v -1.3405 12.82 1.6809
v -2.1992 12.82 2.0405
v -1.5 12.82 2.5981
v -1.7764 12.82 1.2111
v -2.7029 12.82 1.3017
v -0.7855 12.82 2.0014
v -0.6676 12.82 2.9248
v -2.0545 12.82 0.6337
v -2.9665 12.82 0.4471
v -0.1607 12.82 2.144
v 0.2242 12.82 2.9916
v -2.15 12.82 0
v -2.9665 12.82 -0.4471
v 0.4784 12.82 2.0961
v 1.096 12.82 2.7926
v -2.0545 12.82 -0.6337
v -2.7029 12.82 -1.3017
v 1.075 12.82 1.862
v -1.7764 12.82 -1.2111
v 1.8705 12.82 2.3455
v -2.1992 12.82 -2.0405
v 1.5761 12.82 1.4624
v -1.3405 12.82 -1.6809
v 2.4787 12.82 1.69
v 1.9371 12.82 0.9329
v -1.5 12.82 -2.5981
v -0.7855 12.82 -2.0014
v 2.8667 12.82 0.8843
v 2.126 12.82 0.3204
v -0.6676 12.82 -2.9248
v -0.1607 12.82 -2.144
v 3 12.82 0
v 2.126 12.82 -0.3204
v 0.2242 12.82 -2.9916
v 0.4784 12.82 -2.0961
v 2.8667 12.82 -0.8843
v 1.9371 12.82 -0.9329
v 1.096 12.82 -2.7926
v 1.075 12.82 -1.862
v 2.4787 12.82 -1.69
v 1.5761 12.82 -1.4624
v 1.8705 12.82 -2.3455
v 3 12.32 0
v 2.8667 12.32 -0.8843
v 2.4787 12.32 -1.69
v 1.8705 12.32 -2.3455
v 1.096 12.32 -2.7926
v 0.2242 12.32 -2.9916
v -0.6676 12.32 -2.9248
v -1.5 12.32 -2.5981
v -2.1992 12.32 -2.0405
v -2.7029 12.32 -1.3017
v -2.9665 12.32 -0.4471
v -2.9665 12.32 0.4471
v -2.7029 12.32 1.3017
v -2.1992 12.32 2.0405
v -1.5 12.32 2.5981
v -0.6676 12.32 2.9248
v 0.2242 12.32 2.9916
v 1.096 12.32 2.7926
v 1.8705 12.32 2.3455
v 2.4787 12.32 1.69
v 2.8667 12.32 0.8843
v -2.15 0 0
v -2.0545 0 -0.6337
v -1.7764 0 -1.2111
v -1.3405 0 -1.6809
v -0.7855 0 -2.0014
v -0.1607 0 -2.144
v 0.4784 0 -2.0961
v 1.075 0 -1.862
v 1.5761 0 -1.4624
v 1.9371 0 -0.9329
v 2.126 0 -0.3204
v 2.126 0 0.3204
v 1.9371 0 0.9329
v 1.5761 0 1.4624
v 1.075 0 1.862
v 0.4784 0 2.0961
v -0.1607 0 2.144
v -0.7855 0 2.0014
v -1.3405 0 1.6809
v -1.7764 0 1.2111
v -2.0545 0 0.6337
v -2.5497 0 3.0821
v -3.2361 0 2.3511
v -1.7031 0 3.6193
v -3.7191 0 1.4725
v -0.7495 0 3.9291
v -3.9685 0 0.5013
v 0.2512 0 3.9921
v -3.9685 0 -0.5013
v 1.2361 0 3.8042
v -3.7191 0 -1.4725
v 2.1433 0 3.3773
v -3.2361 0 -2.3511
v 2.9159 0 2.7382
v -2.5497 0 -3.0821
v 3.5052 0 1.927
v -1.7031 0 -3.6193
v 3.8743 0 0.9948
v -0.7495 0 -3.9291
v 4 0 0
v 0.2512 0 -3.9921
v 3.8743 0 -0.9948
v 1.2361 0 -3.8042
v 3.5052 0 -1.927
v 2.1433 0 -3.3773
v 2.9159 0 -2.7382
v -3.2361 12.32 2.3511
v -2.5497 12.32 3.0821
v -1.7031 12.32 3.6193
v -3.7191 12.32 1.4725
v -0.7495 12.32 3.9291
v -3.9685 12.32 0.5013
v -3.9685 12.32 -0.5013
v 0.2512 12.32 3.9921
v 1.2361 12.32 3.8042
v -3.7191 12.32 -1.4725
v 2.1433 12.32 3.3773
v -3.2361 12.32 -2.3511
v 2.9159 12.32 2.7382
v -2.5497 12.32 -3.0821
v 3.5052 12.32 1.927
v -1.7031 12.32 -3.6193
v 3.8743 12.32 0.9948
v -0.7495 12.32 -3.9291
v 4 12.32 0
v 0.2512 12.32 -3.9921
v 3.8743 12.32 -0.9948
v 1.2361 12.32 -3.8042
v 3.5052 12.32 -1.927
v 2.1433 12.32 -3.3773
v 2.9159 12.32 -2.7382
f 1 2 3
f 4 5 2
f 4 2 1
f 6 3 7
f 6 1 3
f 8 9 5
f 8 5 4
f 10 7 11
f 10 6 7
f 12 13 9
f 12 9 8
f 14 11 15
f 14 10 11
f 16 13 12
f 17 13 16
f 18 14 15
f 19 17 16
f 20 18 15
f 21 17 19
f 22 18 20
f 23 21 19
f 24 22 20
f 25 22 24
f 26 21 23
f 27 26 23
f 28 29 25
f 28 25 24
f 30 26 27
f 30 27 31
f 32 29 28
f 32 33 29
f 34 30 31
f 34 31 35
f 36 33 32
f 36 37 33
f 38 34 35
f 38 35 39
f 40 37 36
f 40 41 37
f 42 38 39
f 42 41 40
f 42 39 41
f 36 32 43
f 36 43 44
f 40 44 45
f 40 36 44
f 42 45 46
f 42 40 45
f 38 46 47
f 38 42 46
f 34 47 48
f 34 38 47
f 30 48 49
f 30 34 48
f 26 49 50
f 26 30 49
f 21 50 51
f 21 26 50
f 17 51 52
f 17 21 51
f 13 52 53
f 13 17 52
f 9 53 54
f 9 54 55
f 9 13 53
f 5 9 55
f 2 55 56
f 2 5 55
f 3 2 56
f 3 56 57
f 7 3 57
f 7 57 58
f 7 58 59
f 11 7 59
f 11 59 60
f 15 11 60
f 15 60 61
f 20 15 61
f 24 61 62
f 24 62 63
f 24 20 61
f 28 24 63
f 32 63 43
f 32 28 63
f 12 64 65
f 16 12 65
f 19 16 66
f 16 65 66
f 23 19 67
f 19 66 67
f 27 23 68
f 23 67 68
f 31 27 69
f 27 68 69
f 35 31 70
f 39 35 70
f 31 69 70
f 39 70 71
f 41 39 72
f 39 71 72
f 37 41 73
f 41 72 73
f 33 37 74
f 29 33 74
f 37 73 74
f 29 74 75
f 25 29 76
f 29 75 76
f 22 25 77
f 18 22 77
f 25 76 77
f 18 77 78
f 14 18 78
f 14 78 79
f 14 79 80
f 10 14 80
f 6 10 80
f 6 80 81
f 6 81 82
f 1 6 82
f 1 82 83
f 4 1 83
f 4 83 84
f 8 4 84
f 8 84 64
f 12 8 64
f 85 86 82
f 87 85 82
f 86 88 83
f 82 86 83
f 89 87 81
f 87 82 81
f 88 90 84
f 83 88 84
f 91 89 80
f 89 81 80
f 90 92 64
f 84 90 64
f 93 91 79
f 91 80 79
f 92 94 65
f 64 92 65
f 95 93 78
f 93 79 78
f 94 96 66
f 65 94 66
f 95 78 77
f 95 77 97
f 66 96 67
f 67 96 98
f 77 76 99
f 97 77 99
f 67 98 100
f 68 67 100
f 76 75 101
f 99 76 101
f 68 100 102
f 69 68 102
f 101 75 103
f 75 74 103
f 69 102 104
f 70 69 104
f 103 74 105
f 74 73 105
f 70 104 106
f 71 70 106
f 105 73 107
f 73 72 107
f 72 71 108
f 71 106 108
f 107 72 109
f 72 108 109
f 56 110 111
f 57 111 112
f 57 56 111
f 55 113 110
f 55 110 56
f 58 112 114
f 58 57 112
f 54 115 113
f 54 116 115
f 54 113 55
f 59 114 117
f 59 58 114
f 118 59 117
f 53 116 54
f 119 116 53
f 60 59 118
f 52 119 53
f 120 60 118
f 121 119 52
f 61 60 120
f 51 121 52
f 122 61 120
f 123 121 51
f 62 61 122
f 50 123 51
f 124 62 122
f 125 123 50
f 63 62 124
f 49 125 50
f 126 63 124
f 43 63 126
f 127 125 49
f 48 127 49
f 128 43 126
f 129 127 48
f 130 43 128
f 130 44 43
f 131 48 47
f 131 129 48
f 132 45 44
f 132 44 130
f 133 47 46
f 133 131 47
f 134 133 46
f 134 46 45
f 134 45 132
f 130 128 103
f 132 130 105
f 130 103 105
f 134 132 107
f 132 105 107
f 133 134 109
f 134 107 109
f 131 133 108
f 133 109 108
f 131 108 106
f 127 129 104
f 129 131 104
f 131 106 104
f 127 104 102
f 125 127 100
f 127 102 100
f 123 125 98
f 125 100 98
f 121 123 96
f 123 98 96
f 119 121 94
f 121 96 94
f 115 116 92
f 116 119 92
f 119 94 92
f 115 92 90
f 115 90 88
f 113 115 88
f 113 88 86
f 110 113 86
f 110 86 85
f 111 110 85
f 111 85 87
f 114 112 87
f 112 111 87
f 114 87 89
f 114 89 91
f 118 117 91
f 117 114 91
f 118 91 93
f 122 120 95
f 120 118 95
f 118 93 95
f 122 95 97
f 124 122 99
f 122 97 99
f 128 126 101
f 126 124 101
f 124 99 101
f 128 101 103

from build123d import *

# Parameters (mm, degrees)
SKETCH1_R            = 4
BOSS_EXTRUDE1_DEPTH  = 12.82
SKETCH2_OUTSIDE_W    = 13.42
SKETCH2_OUTSIDE_H    = 13.42
SKETCH2_OUTSIDE_R    = 3
CUT_EXTRUDE1_DEPTH   = 0.5
M4_CLEARANCE_HOLE1_D = 4.3


with BuildPart() as part:
    # Sketch1 → Boss-Extrude1 (new body)
    with BuildSketch(Plane(origin=(0, 0, 0), x_dir=(1, 0, 0), z_dir=(0, 1, 0))):
        Circle(SKETCH1_R)
    extrude(amount=BOSS_EXTRUDE1_DEPTH)

    # Sketch2 outside → Cut-Extrude1 (cut)
    with BuildSketch(Plane(origin=(0, 12.82, 0), x_dir=(1, 0, 0), z_dir=(0, 1, 0))):
        Rectangle(SKETCH2_OUTSIDE_W, SKETCH2_OUTSIDE_H)
        Circle(SKETCH2_OUTSIDE_R, mode=Mode.SUBTRACT)
    extrude(amount=-CUT_EXTRUDE1_DEPTH, mode=Mode.SUBTRACT)

    # M4 Clearance Hole1 (through all)
    with Locations(Plane(origin=(0, 12.82, 0), x_dir=(1, 0, 0), z_dir=(0, 1, 0))):
        with Locations((0, 0)):
            Hole(M4_CLEARANCE_HOLE1_D / 2)


solid = part.part
